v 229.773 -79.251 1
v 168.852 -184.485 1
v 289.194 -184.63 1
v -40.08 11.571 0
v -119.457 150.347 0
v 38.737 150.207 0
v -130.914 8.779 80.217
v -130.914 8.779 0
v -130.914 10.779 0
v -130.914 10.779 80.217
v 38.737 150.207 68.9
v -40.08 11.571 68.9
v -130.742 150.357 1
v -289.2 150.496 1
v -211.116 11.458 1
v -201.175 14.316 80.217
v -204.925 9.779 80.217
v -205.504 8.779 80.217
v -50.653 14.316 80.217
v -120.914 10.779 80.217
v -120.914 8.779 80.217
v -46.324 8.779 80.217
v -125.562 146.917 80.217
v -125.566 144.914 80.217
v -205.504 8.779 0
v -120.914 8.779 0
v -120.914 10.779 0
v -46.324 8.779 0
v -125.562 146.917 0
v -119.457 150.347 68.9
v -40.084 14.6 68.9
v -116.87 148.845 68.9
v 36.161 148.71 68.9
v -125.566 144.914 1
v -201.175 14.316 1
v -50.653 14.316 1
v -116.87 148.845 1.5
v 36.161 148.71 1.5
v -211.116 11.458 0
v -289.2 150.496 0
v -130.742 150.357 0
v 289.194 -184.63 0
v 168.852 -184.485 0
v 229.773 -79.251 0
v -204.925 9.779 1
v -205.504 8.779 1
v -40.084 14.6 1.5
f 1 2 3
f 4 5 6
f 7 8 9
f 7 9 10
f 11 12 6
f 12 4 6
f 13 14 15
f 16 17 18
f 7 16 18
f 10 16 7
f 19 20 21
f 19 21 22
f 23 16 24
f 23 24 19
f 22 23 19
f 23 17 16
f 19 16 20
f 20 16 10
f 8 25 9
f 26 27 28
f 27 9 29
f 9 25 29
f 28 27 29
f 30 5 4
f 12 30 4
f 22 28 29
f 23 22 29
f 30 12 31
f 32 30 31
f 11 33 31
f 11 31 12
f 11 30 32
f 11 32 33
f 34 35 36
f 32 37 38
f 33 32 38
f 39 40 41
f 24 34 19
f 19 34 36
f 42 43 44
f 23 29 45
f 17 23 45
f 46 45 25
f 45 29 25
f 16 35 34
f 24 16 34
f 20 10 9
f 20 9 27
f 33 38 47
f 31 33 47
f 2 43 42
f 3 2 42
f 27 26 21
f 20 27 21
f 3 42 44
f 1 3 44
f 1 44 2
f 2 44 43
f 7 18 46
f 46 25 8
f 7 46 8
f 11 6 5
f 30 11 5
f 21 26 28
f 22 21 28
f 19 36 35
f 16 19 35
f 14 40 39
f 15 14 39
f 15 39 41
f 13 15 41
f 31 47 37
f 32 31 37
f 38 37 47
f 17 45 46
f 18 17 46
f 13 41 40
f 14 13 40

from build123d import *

# Parameters (mm, degrees)
F1_DEPTH  = 1
F2_DEPTH  = 1
F4_DEPTH  = 79.217
F5_DEPTH  = 79.217
F6_W      = 10
F6_H      = 80.217
F8_DEPTH  = 2
F9_DEPTH  = 1
F10_DEPTH = 1.5
F12_DEPTH = 67.4


with BuildPart() as f1:
    # F0 (on Top) → F1 (new body)
    with BuildSketch(Plane.XY):
        Polygon((-46.323508, 8.778512), (-125.5624761892, 146.9173285666), (-205.503509, 8.778512), align=None)
    extrude(amount=F1_DEPTH)

    # F3 (on face) → F4 (join)
    with BuildSketch(Plane.XY.offset(1)):
        Polygon((-125.5624761892, 146.9173285666), (-204.9248082785, 9.778512), (-205.503509, 8.778512), (-46.323508, 8.778512), align=None)
        Polygon((-48.0499655476, 9.778512), (-203.8023620844, 9.778512), (-201.1753511319, 14.3160996094), (-125.5662977814, 144.9142241888), (-50.6528093331, 14.3160996094), align=None, mode=Mode.SUBTRACT)
    extrude(amount=F4_DEPTH)

    # F3 (on face) → F5 (join)
    with BuildSketch(Plane.XY.offset(1)):
        Polygon((-201.1753511319, 14.3160996094), (-203.8023620844, 9.778512), (-48.0499655476, 9.778512), (-50.6528093331, 14.3160996094), align=None)
    extrude(amount=F5_DEPTH)

    # F6 (on face) → F8 (cut)
    with BuildSketch(Plane.XZ.offset(-8.778512)):
        with Locations((-125.9135085, 40.1085)):
            Rectangle(F6_W, F6_H)
    extrude(amount=-F8_DEPTH, mode=Mode.SUBTRACT)


with BuildPart() as f2:
    # F0 (on Top) → F2 (new body)
    with BuildSketch(Plane.XY):
        Polygon((168.8516275419, -184.4846511391), (289.193502, -184.630483), (229.773485, -79.250503), align=None)
    extrude(amount=F2_DEPTH)


with BuildPart() as f9:
    # F0 (on Top) → F9 (new body)
    with BuildSketch(Plane.XY):
        Polygon((-211.116485, 11.458495), (-130.7417321458, 150.3568539684), (-289.200497, 150.496498), align=None)
    extrude(amount=F9_DEPTH)


with BuildPart() as f10:
    # F0 (on Top) → F10 (new body)
    with BuildSketch(Plane.XY):
        Polygon((38.737493, 150.207498), (-119.4571138272, 150.3469092386), (-40.080499, 11.571494), align=None)
    extrude(amount=F10_DEPTH)

    # F11 (on face) → F12 (join)
    with BuildSketch(Plane.XY.offset(1.5)):
        Polygon((-119.4571138272, 150.3469092386), (-40.080499, 11.571494), (38.737493, 150.207498), align=None)
        Polygon((-116.8698045165, 148.8446285532), (36.1605270215, 148.7097684053), (-40.0844454768, 14.5995475784), align=None, mode=Mode.SUBTRACT)
    extrude(amount=F12_DEPTH)


solid = Compound([f1.part, f2.part, f9.part, f10.part])
